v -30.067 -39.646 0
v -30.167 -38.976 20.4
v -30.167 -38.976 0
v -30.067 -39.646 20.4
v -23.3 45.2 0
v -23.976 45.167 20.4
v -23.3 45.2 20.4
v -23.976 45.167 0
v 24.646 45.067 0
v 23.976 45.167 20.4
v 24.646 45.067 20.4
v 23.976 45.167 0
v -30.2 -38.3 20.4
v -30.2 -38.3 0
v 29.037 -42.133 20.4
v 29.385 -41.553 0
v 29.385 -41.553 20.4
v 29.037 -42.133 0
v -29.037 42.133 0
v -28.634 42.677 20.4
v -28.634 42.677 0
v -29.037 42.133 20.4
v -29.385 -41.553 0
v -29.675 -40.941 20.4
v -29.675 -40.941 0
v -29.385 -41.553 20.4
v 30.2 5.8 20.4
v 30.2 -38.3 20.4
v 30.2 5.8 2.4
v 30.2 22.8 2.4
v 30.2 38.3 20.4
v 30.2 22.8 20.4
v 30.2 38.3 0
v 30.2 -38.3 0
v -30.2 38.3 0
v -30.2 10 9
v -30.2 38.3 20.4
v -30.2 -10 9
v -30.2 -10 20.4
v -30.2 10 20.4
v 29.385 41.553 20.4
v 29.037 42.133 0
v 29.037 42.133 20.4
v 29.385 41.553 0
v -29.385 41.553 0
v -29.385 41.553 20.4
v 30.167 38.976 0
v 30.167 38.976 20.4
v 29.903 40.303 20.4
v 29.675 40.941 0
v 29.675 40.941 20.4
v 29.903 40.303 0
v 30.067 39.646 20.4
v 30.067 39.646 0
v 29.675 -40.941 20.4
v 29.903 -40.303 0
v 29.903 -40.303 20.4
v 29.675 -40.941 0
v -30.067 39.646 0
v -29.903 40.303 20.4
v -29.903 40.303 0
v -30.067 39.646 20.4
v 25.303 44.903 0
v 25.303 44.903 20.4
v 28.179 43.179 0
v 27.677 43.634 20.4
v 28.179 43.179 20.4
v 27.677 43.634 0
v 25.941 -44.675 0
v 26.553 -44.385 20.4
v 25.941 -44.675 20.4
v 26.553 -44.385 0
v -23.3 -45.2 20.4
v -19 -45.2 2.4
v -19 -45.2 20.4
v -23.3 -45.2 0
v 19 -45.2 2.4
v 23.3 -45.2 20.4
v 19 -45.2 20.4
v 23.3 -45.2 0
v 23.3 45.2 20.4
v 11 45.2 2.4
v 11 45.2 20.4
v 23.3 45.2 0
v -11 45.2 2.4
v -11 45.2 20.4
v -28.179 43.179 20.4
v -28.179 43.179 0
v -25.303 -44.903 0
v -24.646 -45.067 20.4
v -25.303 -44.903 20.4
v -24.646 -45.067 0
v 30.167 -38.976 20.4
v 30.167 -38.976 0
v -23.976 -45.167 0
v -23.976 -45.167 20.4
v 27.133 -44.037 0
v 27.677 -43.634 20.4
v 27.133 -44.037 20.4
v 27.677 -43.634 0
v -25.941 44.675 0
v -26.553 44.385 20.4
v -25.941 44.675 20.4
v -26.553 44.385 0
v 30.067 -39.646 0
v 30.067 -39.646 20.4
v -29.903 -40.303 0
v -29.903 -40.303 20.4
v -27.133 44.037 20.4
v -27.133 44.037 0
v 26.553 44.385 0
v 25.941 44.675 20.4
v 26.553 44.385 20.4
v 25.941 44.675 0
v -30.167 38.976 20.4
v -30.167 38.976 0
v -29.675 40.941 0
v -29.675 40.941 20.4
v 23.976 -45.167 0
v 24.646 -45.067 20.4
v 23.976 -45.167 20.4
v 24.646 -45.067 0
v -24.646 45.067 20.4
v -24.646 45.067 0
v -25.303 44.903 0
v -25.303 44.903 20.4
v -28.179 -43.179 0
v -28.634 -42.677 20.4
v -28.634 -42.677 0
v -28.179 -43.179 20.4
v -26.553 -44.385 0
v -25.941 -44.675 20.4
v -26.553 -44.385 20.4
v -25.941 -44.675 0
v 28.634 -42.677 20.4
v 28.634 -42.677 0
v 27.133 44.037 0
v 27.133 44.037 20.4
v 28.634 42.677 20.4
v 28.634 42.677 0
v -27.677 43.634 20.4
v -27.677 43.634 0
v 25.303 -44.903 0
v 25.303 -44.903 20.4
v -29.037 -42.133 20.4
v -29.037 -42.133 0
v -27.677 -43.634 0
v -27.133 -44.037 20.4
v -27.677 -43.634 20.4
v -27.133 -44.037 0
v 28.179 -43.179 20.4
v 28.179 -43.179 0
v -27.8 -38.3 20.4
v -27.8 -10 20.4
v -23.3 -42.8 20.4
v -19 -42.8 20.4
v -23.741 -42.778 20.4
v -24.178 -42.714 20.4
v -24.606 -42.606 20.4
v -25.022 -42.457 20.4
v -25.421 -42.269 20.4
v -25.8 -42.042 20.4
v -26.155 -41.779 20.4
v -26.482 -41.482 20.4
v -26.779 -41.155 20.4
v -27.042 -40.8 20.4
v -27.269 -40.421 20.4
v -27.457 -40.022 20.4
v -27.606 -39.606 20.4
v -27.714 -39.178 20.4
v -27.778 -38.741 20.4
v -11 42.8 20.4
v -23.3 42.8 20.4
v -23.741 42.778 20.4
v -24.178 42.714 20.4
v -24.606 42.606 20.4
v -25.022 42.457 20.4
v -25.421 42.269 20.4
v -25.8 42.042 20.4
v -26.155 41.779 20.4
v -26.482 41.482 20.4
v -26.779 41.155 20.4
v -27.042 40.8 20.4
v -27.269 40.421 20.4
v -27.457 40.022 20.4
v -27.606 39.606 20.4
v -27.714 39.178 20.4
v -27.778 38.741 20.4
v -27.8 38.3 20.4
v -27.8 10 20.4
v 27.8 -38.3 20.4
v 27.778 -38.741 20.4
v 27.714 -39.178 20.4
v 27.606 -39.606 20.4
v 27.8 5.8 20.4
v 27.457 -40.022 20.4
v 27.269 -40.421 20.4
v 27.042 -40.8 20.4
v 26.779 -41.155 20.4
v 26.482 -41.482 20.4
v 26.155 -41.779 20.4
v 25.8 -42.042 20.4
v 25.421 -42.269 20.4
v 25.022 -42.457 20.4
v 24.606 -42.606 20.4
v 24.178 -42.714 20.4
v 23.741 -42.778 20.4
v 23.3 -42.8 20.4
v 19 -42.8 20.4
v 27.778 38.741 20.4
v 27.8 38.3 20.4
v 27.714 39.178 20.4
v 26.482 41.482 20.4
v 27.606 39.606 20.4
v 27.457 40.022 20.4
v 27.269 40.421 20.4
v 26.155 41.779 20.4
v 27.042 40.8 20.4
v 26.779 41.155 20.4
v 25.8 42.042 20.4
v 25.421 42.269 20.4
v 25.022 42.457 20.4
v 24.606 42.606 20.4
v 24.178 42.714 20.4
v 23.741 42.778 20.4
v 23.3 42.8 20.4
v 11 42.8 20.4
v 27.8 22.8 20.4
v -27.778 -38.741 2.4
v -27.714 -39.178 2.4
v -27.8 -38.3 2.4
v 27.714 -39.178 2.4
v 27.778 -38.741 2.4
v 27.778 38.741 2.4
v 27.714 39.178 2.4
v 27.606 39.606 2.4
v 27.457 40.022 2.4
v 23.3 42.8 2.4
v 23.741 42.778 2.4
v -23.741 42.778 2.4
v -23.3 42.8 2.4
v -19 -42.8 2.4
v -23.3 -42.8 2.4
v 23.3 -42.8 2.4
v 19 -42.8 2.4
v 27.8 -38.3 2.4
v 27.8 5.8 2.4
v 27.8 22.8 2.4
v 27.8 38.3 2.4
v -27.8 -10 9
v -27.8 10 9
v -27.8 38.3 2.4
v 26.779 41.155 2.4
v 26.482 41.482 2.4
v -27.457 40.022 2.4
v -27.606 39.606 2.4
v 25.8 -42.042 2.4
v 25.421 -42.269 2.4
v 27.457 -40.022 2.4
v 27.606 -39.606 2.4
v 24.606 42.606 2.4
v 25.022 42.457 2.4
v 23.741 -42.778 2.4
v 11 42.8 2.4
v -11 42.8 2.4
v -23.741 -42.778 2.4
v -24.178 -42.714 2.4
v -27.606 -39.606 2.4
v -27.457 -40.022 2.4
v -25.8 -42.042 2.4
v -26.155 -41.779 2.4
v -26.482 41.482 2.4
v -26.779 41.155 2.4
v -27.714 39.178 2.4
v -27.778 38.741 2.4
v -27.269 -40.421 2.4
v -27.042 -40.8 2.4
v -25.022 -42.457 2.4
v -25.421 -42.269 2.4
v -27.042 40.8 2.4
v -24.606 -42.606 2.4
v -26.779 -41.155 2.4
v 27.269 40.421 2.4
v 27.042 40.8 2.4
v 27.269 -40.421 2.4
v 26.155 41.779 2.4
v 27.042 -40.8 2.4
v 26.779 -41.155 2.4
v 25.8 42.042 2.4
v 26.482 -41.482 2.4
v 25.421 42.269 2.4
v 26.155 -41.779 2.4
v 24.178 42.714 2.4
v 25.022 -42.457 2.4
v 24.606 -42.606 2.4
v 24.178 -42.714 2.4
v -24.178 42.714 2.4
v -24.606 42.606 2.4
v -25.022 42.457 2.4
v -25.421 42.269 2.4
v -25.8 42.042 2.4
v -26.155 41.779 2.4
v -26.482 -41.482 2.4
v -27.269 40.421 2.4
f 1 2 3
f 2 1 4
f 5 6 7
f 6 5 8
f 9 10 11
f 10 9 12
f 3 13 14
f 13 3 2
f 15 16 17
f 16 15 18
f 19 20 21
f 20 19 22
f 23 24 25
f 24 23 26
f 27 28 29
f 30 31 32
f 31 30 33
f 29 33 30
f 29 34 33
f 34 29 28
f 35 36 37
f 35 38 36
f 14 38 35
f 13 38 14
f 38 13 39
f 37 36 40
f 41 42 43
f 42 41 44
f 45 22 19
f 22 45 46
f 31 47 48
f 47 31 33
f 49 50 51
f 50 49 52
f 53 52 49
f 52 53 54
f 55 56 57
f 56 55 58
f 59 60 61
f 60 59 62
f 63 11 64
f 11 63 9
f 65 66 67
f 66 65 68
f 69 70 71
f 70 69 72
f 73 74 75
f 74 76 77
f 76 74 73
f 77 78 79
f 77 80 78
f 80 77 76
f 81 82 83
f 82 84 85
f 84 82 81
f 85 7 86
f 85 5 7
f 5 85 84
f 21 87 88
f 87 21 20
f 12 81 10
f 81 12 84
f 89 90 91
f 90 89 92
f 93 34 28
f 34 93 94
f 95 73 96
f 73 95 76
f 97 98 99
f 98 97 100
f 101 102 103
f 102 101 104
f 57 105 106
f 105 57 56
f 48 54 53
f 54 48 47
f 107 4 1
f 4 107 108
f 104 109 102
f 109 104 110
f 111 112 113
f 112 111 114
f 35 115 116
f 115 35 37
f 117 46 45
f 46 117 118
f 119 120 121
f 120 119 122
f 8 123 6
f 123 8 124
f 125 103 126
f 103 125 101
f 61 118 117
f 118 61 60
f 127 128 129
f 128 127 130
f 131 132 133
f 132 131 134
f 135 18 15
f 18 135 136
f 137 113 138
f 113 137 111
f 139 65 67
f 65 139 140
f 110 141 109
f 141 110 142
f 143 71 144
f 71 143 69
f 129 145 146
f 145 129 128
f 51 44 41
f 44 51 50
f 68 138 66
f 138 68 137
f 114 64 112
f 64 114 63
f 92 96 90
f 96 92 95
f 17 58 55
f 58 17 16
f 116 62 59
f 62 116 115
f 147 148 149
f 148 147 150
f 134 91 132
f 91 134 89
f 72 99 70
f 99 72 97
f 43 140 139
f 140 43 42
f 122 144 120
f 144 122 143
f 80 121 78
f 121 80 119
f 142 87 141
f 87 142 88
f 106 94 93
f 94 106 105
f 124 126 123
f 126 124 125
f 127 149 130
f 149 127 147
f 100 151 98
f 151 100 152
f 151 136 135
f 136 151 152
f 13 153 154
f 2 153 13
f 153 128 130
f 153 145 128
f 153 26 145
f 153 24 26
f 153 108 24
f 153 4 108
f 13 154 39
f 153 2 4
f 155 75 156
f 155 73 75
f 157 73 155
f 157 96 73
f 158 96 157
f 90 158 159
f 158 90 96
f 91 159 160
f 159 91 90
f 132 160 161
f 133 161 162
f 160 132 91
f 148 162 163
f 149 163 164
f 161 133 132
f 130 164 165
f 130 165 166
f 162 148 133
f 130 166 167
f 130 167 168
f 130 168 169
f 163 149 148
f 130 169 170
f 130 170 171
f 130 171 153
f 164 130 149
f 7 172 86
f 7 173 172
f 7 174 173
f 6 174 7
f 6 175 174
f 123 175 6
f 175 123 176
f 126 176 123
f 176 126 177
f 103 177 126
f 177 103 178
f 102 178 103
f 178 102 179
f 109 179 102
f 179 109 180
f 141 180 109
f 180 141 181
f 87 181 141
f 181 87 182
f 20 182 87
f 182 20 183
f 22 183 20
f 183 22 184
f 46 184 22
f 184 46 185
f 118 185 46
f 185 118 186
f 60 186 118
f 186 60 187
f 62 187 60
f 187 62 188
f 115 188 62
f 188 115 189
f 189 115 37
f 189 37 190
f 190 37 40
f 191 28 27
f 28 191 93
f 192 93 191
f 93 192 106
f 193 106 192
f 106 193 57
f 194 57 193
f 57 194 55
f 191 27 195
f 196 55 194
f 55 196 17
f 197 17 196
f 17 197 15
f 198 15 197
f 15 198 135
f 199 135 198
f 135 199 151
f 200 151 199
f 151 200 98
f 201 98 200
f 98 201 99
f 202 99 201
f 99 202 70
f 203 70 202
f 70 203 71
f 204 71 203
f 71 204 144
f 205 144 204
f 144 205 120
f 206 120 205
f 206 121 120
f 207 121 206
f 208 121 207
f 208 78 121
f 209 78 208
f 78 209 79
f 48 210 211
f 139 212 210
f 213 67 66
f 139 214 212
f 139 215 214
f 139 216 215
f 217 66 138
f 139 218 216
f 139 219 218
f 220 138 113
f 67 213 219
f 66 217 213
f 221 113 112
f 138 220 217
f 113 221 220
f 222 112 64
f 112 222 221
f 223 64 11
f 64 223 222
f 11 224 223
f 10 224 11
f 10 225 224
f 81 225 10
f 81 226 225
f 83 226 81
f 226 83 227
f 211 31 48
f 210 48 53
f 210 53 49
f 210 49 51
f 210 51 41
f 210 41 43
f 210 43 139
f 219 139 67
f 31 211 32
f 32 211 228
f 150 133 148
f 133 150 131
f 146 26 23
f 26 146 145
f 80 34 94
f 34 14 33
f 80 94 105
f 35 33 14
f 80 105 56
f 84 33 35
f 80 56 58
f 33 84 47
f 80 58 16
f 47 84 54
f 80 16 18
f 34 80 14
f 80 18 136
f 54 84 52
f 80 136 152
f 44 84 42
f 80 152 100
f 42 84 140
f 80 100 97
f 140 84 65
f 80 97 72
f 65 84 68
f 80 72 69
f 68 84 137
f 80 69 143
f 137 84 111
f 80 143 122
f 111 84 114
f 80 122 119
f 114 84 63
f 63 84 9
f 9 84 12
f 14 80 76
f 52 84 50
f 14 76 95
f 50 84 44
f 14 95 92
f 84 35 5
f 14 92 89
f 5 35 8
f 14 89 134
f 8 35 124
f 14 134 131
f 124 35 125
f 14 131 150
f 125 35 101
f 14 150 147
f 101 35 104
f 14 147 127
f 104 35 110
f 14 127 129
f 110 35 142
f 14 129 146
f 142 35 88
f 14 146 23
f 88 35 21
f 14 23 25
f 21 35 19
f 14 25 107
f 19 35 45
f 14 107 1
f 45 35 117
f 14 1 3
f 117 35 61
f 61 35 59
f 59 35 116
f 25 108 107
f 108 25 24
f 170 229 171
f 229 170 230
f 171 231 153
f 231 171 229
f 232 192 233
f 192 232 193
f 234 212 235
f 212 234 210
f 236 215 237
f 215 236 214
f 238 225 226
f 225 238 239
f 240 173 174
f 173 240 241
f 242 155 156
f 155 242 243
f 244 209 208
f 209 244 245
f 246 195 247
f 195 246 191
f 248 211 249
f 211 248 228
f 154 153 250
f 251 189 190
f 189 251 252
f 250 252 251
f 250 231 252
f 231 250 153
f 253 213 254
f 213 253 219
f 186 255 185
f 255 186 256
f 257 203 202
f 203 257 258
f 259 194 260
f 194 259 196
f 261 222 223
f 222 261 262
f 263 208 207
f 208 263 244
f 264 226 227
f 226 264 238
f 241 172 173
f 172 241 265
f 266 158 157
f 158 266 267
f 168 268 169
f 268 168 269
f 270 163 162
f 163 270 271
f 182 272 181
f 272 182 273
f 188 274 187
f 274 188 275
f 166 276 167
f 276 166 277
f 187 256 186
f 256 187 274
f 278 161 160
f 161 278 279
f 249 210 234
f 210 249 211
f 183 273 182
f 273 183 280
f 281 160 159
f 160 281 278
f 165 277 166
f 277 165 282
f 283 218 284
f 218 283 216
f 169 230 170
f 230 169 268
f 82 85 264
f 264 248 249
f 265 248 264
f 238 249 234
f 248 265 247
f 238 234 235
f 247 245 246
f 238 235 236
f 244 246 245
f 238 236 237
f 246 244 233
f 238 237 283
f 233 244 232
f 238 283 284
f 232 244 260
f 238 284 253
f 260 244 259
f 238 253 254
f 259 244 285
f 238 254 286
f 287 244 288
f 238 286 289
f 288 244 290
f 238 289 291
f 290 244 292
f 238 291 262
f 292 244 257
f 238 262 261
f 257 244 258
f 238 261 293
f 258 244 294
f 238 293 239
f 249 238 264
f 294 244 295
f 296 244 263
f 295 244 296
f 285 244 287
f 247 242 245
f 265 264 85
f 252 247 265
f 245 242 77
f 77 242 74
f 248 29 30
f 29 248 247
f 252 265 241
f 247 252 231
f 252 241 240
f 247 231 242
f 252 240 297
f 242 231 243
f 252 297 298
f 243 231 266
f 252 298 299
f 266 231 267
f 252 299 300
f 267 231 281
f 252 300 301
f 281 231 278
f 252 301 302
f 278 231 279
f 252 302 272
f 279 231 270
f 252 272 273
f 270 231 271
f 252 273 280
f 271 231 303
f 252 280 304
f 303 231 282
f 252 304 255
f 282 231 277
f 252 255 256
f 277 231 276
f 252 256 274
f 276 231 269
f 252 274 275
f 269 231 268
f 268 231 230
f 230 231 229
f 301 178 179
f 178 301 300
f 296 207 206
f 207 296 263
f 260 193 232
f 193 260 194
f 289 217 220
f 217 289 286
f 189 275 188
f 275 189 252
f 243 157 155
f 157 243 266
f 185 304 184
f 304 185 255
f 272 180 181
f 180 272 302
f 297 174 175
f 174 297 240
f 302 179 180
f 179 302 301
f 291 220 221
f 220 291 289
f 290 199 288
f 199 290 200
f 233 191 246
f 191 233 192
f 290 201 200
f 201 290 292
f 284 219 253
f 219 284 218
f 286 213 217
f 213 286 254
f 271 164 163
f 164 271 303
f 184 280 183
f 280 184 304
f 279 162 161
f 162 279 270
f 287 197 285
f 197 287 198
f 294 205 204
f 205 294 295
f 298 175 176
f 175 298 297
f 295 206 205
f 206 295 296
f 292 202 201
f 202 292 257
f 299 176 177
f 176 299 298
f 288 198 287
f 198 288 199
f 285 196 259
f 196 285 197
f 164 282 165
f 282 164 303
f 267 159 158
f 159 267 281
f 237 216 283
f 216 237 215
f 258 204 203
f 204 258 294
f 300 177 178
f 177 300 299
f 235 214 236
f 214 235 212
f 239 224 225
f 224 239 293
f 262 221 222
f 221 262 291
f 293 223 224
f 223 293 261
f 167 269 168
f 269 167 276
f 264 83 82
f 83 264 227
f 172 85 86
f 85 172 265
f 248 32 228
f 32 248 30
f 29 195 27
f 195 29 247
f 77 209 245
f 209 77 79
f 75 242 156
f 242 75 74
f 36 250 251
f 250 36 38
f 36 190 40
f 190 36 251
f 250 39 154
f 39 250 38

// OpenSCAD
// ==============================================================================
// Columbus P-1 Mark II (P-1 M2) GNSS Data Logger - Mounting Base (Open Front Box)
// Model: Straight Vertical Walls (Option B: Flat interior for friction / foam fit)
// Mounting: Completely Flat Bottom Exterior for Double-Sided Tape (3M VHB)
// Author: Aubrey Han & Antigravity
// ==============================================================================

$fn = 64; // High resolution curve rendering

// ------------------------------------------------------------------------------
// 1. Device Dimensions & Clearances
// ------------------------------------------------------------------------------
dev_w = 55.0;            // Device width (mm)
dev_h = 85.0;            // Device height (mm)
dev_d = 17.7;            // Device thickness (mm)

fit_tol_xy = 0.30;       // Single side clearance for smooth drop-in
fit_tol_z  = 0.30;       // Depth clearance so front is flush or slightly recessed

cav_w = dev_w + 2 * fit_tol_xy;  // 55.6 mm
cav_h = dev_h + 2 * fit_tol_xy;  // 85.6 mm
cav_d = dev_d + fit_tol_z;        // 18.0 mm
r_inner = 4.5;                   // Inner corner radius (matching device corners)

// ------------------------------------------------------------------------------
// 2. Base & Wall Dimensions
// ------------------------------------------------------------------------------
wall_thick = 2.4;        // Wall thickness (6 perimeters with 0.4mm nozzle)
floor_thick = 2.4;       // Base plate thickness (solid and flat for tape)

out_w = cav_w + 2 * wall_thick;  // 60.4 mm
out_h = cav_h + 2 * wall_thick;  // 90.4 mm
out_d = floor_thick + cav_d;     // 20.4 mm
r_outer = r_inner + wall_thick;  // 6.9 mm

// ------------------------------------------------------------------------------
// 3. Cutout Specifications
// ------------------------------------------------------------------------------
// Top Power Button Cutout
top_cut_w = 22.0;

// Right Function Button (FN) Cutout (Measured from top inner edge)
fn_from_top_start = 20.0;
fn_from_top_end   = 37.0;
fn_cut_len = fn_from_top_end - fn_from_top_start; // 17.0 mm

// Bottom Port Cutout (MicroUSB & Rubber Cap)
bot_cut_w = 38.0;

// Left Finger Grip Notch (For easy device removal)
finger_notch_w = 20.0;
finger_notch_depth = 11.4; // Cuts from top rim (Z=20.4) down to Z=9.0

// ------------------------------------------------------------------------------
// Modules
// ------------------------------------------------------------------------------
module rounded_rect(w, h, r, z_height) {
    x_half = w / 2 - r;
    y_half = h / 2 - r;
    linear_extrude(height = z_height) {
        hull() {
            translate([ x_half,  y_half, 0]) circle(r = r);
            translate([-x_half,  y_half, 0]) circle(r = r);
            translate([-x_half, -y_half, 0]) circle(r = r);
            translate([ x_half, -y_half, 0]) circle(r = r);
        }
    }
}

module p1m2_mounting_dock() {
    difference() {
        // Outer Solid Box with flat bottom at Z=0
        rounded_rect(out_w, out_h, r_outer, out_d);

        // 1. Inner Cavity (straight vertical walls)
        translate([0, 0, floor_thick])
            rounded_rect(cav_w, cav_h, r_inner, cav_d + 1.0);

        // 2. Top Cutout (Power Button)
        translate([-top_cut_w / 2, cav_h / 2 - 1.0, floor_thick])
            cube([top_cut_w, wall_thick + 2.0, cav_d + 1.0]);

        // 3. Right Cutout (Function Button FN)
        // Cavity top is at Y = cav_h / 2
        // Cutout span: Y = cav_h/2 - fn_from_top_end to cav_h/2 - fn_from_top_start
        translate([cav_w / 2 - 1.0, (cav_h / 2) - fn_from_top_end, floor_thick])
            cube([wall_thick + 2.0, fn_cut_len, cav_d + 1.0]);

        // 4. Bottom Cutout (MicroUSB / Cover)
        translate([-bot_cut_w / 2, -cav_h / 2 - wall_thick - 1.0, floor_thick])
            cube([bot_cut_w, wall_thick + 2.0, cav_d + 1.0]);

        // 5. Left Finger Grip Notch (Rounded dip on left wall)
        translate([-cav_w / 2 - wall_thick - 1.0, -finger_notch_w / 2, out_d - finger_notch_depth])
            cube([wall_thick + 2.0, finger_notch_w, finger_notch_depth + 1.0]);
    }
}

// Render the model
p1m2_mounting_dock();
